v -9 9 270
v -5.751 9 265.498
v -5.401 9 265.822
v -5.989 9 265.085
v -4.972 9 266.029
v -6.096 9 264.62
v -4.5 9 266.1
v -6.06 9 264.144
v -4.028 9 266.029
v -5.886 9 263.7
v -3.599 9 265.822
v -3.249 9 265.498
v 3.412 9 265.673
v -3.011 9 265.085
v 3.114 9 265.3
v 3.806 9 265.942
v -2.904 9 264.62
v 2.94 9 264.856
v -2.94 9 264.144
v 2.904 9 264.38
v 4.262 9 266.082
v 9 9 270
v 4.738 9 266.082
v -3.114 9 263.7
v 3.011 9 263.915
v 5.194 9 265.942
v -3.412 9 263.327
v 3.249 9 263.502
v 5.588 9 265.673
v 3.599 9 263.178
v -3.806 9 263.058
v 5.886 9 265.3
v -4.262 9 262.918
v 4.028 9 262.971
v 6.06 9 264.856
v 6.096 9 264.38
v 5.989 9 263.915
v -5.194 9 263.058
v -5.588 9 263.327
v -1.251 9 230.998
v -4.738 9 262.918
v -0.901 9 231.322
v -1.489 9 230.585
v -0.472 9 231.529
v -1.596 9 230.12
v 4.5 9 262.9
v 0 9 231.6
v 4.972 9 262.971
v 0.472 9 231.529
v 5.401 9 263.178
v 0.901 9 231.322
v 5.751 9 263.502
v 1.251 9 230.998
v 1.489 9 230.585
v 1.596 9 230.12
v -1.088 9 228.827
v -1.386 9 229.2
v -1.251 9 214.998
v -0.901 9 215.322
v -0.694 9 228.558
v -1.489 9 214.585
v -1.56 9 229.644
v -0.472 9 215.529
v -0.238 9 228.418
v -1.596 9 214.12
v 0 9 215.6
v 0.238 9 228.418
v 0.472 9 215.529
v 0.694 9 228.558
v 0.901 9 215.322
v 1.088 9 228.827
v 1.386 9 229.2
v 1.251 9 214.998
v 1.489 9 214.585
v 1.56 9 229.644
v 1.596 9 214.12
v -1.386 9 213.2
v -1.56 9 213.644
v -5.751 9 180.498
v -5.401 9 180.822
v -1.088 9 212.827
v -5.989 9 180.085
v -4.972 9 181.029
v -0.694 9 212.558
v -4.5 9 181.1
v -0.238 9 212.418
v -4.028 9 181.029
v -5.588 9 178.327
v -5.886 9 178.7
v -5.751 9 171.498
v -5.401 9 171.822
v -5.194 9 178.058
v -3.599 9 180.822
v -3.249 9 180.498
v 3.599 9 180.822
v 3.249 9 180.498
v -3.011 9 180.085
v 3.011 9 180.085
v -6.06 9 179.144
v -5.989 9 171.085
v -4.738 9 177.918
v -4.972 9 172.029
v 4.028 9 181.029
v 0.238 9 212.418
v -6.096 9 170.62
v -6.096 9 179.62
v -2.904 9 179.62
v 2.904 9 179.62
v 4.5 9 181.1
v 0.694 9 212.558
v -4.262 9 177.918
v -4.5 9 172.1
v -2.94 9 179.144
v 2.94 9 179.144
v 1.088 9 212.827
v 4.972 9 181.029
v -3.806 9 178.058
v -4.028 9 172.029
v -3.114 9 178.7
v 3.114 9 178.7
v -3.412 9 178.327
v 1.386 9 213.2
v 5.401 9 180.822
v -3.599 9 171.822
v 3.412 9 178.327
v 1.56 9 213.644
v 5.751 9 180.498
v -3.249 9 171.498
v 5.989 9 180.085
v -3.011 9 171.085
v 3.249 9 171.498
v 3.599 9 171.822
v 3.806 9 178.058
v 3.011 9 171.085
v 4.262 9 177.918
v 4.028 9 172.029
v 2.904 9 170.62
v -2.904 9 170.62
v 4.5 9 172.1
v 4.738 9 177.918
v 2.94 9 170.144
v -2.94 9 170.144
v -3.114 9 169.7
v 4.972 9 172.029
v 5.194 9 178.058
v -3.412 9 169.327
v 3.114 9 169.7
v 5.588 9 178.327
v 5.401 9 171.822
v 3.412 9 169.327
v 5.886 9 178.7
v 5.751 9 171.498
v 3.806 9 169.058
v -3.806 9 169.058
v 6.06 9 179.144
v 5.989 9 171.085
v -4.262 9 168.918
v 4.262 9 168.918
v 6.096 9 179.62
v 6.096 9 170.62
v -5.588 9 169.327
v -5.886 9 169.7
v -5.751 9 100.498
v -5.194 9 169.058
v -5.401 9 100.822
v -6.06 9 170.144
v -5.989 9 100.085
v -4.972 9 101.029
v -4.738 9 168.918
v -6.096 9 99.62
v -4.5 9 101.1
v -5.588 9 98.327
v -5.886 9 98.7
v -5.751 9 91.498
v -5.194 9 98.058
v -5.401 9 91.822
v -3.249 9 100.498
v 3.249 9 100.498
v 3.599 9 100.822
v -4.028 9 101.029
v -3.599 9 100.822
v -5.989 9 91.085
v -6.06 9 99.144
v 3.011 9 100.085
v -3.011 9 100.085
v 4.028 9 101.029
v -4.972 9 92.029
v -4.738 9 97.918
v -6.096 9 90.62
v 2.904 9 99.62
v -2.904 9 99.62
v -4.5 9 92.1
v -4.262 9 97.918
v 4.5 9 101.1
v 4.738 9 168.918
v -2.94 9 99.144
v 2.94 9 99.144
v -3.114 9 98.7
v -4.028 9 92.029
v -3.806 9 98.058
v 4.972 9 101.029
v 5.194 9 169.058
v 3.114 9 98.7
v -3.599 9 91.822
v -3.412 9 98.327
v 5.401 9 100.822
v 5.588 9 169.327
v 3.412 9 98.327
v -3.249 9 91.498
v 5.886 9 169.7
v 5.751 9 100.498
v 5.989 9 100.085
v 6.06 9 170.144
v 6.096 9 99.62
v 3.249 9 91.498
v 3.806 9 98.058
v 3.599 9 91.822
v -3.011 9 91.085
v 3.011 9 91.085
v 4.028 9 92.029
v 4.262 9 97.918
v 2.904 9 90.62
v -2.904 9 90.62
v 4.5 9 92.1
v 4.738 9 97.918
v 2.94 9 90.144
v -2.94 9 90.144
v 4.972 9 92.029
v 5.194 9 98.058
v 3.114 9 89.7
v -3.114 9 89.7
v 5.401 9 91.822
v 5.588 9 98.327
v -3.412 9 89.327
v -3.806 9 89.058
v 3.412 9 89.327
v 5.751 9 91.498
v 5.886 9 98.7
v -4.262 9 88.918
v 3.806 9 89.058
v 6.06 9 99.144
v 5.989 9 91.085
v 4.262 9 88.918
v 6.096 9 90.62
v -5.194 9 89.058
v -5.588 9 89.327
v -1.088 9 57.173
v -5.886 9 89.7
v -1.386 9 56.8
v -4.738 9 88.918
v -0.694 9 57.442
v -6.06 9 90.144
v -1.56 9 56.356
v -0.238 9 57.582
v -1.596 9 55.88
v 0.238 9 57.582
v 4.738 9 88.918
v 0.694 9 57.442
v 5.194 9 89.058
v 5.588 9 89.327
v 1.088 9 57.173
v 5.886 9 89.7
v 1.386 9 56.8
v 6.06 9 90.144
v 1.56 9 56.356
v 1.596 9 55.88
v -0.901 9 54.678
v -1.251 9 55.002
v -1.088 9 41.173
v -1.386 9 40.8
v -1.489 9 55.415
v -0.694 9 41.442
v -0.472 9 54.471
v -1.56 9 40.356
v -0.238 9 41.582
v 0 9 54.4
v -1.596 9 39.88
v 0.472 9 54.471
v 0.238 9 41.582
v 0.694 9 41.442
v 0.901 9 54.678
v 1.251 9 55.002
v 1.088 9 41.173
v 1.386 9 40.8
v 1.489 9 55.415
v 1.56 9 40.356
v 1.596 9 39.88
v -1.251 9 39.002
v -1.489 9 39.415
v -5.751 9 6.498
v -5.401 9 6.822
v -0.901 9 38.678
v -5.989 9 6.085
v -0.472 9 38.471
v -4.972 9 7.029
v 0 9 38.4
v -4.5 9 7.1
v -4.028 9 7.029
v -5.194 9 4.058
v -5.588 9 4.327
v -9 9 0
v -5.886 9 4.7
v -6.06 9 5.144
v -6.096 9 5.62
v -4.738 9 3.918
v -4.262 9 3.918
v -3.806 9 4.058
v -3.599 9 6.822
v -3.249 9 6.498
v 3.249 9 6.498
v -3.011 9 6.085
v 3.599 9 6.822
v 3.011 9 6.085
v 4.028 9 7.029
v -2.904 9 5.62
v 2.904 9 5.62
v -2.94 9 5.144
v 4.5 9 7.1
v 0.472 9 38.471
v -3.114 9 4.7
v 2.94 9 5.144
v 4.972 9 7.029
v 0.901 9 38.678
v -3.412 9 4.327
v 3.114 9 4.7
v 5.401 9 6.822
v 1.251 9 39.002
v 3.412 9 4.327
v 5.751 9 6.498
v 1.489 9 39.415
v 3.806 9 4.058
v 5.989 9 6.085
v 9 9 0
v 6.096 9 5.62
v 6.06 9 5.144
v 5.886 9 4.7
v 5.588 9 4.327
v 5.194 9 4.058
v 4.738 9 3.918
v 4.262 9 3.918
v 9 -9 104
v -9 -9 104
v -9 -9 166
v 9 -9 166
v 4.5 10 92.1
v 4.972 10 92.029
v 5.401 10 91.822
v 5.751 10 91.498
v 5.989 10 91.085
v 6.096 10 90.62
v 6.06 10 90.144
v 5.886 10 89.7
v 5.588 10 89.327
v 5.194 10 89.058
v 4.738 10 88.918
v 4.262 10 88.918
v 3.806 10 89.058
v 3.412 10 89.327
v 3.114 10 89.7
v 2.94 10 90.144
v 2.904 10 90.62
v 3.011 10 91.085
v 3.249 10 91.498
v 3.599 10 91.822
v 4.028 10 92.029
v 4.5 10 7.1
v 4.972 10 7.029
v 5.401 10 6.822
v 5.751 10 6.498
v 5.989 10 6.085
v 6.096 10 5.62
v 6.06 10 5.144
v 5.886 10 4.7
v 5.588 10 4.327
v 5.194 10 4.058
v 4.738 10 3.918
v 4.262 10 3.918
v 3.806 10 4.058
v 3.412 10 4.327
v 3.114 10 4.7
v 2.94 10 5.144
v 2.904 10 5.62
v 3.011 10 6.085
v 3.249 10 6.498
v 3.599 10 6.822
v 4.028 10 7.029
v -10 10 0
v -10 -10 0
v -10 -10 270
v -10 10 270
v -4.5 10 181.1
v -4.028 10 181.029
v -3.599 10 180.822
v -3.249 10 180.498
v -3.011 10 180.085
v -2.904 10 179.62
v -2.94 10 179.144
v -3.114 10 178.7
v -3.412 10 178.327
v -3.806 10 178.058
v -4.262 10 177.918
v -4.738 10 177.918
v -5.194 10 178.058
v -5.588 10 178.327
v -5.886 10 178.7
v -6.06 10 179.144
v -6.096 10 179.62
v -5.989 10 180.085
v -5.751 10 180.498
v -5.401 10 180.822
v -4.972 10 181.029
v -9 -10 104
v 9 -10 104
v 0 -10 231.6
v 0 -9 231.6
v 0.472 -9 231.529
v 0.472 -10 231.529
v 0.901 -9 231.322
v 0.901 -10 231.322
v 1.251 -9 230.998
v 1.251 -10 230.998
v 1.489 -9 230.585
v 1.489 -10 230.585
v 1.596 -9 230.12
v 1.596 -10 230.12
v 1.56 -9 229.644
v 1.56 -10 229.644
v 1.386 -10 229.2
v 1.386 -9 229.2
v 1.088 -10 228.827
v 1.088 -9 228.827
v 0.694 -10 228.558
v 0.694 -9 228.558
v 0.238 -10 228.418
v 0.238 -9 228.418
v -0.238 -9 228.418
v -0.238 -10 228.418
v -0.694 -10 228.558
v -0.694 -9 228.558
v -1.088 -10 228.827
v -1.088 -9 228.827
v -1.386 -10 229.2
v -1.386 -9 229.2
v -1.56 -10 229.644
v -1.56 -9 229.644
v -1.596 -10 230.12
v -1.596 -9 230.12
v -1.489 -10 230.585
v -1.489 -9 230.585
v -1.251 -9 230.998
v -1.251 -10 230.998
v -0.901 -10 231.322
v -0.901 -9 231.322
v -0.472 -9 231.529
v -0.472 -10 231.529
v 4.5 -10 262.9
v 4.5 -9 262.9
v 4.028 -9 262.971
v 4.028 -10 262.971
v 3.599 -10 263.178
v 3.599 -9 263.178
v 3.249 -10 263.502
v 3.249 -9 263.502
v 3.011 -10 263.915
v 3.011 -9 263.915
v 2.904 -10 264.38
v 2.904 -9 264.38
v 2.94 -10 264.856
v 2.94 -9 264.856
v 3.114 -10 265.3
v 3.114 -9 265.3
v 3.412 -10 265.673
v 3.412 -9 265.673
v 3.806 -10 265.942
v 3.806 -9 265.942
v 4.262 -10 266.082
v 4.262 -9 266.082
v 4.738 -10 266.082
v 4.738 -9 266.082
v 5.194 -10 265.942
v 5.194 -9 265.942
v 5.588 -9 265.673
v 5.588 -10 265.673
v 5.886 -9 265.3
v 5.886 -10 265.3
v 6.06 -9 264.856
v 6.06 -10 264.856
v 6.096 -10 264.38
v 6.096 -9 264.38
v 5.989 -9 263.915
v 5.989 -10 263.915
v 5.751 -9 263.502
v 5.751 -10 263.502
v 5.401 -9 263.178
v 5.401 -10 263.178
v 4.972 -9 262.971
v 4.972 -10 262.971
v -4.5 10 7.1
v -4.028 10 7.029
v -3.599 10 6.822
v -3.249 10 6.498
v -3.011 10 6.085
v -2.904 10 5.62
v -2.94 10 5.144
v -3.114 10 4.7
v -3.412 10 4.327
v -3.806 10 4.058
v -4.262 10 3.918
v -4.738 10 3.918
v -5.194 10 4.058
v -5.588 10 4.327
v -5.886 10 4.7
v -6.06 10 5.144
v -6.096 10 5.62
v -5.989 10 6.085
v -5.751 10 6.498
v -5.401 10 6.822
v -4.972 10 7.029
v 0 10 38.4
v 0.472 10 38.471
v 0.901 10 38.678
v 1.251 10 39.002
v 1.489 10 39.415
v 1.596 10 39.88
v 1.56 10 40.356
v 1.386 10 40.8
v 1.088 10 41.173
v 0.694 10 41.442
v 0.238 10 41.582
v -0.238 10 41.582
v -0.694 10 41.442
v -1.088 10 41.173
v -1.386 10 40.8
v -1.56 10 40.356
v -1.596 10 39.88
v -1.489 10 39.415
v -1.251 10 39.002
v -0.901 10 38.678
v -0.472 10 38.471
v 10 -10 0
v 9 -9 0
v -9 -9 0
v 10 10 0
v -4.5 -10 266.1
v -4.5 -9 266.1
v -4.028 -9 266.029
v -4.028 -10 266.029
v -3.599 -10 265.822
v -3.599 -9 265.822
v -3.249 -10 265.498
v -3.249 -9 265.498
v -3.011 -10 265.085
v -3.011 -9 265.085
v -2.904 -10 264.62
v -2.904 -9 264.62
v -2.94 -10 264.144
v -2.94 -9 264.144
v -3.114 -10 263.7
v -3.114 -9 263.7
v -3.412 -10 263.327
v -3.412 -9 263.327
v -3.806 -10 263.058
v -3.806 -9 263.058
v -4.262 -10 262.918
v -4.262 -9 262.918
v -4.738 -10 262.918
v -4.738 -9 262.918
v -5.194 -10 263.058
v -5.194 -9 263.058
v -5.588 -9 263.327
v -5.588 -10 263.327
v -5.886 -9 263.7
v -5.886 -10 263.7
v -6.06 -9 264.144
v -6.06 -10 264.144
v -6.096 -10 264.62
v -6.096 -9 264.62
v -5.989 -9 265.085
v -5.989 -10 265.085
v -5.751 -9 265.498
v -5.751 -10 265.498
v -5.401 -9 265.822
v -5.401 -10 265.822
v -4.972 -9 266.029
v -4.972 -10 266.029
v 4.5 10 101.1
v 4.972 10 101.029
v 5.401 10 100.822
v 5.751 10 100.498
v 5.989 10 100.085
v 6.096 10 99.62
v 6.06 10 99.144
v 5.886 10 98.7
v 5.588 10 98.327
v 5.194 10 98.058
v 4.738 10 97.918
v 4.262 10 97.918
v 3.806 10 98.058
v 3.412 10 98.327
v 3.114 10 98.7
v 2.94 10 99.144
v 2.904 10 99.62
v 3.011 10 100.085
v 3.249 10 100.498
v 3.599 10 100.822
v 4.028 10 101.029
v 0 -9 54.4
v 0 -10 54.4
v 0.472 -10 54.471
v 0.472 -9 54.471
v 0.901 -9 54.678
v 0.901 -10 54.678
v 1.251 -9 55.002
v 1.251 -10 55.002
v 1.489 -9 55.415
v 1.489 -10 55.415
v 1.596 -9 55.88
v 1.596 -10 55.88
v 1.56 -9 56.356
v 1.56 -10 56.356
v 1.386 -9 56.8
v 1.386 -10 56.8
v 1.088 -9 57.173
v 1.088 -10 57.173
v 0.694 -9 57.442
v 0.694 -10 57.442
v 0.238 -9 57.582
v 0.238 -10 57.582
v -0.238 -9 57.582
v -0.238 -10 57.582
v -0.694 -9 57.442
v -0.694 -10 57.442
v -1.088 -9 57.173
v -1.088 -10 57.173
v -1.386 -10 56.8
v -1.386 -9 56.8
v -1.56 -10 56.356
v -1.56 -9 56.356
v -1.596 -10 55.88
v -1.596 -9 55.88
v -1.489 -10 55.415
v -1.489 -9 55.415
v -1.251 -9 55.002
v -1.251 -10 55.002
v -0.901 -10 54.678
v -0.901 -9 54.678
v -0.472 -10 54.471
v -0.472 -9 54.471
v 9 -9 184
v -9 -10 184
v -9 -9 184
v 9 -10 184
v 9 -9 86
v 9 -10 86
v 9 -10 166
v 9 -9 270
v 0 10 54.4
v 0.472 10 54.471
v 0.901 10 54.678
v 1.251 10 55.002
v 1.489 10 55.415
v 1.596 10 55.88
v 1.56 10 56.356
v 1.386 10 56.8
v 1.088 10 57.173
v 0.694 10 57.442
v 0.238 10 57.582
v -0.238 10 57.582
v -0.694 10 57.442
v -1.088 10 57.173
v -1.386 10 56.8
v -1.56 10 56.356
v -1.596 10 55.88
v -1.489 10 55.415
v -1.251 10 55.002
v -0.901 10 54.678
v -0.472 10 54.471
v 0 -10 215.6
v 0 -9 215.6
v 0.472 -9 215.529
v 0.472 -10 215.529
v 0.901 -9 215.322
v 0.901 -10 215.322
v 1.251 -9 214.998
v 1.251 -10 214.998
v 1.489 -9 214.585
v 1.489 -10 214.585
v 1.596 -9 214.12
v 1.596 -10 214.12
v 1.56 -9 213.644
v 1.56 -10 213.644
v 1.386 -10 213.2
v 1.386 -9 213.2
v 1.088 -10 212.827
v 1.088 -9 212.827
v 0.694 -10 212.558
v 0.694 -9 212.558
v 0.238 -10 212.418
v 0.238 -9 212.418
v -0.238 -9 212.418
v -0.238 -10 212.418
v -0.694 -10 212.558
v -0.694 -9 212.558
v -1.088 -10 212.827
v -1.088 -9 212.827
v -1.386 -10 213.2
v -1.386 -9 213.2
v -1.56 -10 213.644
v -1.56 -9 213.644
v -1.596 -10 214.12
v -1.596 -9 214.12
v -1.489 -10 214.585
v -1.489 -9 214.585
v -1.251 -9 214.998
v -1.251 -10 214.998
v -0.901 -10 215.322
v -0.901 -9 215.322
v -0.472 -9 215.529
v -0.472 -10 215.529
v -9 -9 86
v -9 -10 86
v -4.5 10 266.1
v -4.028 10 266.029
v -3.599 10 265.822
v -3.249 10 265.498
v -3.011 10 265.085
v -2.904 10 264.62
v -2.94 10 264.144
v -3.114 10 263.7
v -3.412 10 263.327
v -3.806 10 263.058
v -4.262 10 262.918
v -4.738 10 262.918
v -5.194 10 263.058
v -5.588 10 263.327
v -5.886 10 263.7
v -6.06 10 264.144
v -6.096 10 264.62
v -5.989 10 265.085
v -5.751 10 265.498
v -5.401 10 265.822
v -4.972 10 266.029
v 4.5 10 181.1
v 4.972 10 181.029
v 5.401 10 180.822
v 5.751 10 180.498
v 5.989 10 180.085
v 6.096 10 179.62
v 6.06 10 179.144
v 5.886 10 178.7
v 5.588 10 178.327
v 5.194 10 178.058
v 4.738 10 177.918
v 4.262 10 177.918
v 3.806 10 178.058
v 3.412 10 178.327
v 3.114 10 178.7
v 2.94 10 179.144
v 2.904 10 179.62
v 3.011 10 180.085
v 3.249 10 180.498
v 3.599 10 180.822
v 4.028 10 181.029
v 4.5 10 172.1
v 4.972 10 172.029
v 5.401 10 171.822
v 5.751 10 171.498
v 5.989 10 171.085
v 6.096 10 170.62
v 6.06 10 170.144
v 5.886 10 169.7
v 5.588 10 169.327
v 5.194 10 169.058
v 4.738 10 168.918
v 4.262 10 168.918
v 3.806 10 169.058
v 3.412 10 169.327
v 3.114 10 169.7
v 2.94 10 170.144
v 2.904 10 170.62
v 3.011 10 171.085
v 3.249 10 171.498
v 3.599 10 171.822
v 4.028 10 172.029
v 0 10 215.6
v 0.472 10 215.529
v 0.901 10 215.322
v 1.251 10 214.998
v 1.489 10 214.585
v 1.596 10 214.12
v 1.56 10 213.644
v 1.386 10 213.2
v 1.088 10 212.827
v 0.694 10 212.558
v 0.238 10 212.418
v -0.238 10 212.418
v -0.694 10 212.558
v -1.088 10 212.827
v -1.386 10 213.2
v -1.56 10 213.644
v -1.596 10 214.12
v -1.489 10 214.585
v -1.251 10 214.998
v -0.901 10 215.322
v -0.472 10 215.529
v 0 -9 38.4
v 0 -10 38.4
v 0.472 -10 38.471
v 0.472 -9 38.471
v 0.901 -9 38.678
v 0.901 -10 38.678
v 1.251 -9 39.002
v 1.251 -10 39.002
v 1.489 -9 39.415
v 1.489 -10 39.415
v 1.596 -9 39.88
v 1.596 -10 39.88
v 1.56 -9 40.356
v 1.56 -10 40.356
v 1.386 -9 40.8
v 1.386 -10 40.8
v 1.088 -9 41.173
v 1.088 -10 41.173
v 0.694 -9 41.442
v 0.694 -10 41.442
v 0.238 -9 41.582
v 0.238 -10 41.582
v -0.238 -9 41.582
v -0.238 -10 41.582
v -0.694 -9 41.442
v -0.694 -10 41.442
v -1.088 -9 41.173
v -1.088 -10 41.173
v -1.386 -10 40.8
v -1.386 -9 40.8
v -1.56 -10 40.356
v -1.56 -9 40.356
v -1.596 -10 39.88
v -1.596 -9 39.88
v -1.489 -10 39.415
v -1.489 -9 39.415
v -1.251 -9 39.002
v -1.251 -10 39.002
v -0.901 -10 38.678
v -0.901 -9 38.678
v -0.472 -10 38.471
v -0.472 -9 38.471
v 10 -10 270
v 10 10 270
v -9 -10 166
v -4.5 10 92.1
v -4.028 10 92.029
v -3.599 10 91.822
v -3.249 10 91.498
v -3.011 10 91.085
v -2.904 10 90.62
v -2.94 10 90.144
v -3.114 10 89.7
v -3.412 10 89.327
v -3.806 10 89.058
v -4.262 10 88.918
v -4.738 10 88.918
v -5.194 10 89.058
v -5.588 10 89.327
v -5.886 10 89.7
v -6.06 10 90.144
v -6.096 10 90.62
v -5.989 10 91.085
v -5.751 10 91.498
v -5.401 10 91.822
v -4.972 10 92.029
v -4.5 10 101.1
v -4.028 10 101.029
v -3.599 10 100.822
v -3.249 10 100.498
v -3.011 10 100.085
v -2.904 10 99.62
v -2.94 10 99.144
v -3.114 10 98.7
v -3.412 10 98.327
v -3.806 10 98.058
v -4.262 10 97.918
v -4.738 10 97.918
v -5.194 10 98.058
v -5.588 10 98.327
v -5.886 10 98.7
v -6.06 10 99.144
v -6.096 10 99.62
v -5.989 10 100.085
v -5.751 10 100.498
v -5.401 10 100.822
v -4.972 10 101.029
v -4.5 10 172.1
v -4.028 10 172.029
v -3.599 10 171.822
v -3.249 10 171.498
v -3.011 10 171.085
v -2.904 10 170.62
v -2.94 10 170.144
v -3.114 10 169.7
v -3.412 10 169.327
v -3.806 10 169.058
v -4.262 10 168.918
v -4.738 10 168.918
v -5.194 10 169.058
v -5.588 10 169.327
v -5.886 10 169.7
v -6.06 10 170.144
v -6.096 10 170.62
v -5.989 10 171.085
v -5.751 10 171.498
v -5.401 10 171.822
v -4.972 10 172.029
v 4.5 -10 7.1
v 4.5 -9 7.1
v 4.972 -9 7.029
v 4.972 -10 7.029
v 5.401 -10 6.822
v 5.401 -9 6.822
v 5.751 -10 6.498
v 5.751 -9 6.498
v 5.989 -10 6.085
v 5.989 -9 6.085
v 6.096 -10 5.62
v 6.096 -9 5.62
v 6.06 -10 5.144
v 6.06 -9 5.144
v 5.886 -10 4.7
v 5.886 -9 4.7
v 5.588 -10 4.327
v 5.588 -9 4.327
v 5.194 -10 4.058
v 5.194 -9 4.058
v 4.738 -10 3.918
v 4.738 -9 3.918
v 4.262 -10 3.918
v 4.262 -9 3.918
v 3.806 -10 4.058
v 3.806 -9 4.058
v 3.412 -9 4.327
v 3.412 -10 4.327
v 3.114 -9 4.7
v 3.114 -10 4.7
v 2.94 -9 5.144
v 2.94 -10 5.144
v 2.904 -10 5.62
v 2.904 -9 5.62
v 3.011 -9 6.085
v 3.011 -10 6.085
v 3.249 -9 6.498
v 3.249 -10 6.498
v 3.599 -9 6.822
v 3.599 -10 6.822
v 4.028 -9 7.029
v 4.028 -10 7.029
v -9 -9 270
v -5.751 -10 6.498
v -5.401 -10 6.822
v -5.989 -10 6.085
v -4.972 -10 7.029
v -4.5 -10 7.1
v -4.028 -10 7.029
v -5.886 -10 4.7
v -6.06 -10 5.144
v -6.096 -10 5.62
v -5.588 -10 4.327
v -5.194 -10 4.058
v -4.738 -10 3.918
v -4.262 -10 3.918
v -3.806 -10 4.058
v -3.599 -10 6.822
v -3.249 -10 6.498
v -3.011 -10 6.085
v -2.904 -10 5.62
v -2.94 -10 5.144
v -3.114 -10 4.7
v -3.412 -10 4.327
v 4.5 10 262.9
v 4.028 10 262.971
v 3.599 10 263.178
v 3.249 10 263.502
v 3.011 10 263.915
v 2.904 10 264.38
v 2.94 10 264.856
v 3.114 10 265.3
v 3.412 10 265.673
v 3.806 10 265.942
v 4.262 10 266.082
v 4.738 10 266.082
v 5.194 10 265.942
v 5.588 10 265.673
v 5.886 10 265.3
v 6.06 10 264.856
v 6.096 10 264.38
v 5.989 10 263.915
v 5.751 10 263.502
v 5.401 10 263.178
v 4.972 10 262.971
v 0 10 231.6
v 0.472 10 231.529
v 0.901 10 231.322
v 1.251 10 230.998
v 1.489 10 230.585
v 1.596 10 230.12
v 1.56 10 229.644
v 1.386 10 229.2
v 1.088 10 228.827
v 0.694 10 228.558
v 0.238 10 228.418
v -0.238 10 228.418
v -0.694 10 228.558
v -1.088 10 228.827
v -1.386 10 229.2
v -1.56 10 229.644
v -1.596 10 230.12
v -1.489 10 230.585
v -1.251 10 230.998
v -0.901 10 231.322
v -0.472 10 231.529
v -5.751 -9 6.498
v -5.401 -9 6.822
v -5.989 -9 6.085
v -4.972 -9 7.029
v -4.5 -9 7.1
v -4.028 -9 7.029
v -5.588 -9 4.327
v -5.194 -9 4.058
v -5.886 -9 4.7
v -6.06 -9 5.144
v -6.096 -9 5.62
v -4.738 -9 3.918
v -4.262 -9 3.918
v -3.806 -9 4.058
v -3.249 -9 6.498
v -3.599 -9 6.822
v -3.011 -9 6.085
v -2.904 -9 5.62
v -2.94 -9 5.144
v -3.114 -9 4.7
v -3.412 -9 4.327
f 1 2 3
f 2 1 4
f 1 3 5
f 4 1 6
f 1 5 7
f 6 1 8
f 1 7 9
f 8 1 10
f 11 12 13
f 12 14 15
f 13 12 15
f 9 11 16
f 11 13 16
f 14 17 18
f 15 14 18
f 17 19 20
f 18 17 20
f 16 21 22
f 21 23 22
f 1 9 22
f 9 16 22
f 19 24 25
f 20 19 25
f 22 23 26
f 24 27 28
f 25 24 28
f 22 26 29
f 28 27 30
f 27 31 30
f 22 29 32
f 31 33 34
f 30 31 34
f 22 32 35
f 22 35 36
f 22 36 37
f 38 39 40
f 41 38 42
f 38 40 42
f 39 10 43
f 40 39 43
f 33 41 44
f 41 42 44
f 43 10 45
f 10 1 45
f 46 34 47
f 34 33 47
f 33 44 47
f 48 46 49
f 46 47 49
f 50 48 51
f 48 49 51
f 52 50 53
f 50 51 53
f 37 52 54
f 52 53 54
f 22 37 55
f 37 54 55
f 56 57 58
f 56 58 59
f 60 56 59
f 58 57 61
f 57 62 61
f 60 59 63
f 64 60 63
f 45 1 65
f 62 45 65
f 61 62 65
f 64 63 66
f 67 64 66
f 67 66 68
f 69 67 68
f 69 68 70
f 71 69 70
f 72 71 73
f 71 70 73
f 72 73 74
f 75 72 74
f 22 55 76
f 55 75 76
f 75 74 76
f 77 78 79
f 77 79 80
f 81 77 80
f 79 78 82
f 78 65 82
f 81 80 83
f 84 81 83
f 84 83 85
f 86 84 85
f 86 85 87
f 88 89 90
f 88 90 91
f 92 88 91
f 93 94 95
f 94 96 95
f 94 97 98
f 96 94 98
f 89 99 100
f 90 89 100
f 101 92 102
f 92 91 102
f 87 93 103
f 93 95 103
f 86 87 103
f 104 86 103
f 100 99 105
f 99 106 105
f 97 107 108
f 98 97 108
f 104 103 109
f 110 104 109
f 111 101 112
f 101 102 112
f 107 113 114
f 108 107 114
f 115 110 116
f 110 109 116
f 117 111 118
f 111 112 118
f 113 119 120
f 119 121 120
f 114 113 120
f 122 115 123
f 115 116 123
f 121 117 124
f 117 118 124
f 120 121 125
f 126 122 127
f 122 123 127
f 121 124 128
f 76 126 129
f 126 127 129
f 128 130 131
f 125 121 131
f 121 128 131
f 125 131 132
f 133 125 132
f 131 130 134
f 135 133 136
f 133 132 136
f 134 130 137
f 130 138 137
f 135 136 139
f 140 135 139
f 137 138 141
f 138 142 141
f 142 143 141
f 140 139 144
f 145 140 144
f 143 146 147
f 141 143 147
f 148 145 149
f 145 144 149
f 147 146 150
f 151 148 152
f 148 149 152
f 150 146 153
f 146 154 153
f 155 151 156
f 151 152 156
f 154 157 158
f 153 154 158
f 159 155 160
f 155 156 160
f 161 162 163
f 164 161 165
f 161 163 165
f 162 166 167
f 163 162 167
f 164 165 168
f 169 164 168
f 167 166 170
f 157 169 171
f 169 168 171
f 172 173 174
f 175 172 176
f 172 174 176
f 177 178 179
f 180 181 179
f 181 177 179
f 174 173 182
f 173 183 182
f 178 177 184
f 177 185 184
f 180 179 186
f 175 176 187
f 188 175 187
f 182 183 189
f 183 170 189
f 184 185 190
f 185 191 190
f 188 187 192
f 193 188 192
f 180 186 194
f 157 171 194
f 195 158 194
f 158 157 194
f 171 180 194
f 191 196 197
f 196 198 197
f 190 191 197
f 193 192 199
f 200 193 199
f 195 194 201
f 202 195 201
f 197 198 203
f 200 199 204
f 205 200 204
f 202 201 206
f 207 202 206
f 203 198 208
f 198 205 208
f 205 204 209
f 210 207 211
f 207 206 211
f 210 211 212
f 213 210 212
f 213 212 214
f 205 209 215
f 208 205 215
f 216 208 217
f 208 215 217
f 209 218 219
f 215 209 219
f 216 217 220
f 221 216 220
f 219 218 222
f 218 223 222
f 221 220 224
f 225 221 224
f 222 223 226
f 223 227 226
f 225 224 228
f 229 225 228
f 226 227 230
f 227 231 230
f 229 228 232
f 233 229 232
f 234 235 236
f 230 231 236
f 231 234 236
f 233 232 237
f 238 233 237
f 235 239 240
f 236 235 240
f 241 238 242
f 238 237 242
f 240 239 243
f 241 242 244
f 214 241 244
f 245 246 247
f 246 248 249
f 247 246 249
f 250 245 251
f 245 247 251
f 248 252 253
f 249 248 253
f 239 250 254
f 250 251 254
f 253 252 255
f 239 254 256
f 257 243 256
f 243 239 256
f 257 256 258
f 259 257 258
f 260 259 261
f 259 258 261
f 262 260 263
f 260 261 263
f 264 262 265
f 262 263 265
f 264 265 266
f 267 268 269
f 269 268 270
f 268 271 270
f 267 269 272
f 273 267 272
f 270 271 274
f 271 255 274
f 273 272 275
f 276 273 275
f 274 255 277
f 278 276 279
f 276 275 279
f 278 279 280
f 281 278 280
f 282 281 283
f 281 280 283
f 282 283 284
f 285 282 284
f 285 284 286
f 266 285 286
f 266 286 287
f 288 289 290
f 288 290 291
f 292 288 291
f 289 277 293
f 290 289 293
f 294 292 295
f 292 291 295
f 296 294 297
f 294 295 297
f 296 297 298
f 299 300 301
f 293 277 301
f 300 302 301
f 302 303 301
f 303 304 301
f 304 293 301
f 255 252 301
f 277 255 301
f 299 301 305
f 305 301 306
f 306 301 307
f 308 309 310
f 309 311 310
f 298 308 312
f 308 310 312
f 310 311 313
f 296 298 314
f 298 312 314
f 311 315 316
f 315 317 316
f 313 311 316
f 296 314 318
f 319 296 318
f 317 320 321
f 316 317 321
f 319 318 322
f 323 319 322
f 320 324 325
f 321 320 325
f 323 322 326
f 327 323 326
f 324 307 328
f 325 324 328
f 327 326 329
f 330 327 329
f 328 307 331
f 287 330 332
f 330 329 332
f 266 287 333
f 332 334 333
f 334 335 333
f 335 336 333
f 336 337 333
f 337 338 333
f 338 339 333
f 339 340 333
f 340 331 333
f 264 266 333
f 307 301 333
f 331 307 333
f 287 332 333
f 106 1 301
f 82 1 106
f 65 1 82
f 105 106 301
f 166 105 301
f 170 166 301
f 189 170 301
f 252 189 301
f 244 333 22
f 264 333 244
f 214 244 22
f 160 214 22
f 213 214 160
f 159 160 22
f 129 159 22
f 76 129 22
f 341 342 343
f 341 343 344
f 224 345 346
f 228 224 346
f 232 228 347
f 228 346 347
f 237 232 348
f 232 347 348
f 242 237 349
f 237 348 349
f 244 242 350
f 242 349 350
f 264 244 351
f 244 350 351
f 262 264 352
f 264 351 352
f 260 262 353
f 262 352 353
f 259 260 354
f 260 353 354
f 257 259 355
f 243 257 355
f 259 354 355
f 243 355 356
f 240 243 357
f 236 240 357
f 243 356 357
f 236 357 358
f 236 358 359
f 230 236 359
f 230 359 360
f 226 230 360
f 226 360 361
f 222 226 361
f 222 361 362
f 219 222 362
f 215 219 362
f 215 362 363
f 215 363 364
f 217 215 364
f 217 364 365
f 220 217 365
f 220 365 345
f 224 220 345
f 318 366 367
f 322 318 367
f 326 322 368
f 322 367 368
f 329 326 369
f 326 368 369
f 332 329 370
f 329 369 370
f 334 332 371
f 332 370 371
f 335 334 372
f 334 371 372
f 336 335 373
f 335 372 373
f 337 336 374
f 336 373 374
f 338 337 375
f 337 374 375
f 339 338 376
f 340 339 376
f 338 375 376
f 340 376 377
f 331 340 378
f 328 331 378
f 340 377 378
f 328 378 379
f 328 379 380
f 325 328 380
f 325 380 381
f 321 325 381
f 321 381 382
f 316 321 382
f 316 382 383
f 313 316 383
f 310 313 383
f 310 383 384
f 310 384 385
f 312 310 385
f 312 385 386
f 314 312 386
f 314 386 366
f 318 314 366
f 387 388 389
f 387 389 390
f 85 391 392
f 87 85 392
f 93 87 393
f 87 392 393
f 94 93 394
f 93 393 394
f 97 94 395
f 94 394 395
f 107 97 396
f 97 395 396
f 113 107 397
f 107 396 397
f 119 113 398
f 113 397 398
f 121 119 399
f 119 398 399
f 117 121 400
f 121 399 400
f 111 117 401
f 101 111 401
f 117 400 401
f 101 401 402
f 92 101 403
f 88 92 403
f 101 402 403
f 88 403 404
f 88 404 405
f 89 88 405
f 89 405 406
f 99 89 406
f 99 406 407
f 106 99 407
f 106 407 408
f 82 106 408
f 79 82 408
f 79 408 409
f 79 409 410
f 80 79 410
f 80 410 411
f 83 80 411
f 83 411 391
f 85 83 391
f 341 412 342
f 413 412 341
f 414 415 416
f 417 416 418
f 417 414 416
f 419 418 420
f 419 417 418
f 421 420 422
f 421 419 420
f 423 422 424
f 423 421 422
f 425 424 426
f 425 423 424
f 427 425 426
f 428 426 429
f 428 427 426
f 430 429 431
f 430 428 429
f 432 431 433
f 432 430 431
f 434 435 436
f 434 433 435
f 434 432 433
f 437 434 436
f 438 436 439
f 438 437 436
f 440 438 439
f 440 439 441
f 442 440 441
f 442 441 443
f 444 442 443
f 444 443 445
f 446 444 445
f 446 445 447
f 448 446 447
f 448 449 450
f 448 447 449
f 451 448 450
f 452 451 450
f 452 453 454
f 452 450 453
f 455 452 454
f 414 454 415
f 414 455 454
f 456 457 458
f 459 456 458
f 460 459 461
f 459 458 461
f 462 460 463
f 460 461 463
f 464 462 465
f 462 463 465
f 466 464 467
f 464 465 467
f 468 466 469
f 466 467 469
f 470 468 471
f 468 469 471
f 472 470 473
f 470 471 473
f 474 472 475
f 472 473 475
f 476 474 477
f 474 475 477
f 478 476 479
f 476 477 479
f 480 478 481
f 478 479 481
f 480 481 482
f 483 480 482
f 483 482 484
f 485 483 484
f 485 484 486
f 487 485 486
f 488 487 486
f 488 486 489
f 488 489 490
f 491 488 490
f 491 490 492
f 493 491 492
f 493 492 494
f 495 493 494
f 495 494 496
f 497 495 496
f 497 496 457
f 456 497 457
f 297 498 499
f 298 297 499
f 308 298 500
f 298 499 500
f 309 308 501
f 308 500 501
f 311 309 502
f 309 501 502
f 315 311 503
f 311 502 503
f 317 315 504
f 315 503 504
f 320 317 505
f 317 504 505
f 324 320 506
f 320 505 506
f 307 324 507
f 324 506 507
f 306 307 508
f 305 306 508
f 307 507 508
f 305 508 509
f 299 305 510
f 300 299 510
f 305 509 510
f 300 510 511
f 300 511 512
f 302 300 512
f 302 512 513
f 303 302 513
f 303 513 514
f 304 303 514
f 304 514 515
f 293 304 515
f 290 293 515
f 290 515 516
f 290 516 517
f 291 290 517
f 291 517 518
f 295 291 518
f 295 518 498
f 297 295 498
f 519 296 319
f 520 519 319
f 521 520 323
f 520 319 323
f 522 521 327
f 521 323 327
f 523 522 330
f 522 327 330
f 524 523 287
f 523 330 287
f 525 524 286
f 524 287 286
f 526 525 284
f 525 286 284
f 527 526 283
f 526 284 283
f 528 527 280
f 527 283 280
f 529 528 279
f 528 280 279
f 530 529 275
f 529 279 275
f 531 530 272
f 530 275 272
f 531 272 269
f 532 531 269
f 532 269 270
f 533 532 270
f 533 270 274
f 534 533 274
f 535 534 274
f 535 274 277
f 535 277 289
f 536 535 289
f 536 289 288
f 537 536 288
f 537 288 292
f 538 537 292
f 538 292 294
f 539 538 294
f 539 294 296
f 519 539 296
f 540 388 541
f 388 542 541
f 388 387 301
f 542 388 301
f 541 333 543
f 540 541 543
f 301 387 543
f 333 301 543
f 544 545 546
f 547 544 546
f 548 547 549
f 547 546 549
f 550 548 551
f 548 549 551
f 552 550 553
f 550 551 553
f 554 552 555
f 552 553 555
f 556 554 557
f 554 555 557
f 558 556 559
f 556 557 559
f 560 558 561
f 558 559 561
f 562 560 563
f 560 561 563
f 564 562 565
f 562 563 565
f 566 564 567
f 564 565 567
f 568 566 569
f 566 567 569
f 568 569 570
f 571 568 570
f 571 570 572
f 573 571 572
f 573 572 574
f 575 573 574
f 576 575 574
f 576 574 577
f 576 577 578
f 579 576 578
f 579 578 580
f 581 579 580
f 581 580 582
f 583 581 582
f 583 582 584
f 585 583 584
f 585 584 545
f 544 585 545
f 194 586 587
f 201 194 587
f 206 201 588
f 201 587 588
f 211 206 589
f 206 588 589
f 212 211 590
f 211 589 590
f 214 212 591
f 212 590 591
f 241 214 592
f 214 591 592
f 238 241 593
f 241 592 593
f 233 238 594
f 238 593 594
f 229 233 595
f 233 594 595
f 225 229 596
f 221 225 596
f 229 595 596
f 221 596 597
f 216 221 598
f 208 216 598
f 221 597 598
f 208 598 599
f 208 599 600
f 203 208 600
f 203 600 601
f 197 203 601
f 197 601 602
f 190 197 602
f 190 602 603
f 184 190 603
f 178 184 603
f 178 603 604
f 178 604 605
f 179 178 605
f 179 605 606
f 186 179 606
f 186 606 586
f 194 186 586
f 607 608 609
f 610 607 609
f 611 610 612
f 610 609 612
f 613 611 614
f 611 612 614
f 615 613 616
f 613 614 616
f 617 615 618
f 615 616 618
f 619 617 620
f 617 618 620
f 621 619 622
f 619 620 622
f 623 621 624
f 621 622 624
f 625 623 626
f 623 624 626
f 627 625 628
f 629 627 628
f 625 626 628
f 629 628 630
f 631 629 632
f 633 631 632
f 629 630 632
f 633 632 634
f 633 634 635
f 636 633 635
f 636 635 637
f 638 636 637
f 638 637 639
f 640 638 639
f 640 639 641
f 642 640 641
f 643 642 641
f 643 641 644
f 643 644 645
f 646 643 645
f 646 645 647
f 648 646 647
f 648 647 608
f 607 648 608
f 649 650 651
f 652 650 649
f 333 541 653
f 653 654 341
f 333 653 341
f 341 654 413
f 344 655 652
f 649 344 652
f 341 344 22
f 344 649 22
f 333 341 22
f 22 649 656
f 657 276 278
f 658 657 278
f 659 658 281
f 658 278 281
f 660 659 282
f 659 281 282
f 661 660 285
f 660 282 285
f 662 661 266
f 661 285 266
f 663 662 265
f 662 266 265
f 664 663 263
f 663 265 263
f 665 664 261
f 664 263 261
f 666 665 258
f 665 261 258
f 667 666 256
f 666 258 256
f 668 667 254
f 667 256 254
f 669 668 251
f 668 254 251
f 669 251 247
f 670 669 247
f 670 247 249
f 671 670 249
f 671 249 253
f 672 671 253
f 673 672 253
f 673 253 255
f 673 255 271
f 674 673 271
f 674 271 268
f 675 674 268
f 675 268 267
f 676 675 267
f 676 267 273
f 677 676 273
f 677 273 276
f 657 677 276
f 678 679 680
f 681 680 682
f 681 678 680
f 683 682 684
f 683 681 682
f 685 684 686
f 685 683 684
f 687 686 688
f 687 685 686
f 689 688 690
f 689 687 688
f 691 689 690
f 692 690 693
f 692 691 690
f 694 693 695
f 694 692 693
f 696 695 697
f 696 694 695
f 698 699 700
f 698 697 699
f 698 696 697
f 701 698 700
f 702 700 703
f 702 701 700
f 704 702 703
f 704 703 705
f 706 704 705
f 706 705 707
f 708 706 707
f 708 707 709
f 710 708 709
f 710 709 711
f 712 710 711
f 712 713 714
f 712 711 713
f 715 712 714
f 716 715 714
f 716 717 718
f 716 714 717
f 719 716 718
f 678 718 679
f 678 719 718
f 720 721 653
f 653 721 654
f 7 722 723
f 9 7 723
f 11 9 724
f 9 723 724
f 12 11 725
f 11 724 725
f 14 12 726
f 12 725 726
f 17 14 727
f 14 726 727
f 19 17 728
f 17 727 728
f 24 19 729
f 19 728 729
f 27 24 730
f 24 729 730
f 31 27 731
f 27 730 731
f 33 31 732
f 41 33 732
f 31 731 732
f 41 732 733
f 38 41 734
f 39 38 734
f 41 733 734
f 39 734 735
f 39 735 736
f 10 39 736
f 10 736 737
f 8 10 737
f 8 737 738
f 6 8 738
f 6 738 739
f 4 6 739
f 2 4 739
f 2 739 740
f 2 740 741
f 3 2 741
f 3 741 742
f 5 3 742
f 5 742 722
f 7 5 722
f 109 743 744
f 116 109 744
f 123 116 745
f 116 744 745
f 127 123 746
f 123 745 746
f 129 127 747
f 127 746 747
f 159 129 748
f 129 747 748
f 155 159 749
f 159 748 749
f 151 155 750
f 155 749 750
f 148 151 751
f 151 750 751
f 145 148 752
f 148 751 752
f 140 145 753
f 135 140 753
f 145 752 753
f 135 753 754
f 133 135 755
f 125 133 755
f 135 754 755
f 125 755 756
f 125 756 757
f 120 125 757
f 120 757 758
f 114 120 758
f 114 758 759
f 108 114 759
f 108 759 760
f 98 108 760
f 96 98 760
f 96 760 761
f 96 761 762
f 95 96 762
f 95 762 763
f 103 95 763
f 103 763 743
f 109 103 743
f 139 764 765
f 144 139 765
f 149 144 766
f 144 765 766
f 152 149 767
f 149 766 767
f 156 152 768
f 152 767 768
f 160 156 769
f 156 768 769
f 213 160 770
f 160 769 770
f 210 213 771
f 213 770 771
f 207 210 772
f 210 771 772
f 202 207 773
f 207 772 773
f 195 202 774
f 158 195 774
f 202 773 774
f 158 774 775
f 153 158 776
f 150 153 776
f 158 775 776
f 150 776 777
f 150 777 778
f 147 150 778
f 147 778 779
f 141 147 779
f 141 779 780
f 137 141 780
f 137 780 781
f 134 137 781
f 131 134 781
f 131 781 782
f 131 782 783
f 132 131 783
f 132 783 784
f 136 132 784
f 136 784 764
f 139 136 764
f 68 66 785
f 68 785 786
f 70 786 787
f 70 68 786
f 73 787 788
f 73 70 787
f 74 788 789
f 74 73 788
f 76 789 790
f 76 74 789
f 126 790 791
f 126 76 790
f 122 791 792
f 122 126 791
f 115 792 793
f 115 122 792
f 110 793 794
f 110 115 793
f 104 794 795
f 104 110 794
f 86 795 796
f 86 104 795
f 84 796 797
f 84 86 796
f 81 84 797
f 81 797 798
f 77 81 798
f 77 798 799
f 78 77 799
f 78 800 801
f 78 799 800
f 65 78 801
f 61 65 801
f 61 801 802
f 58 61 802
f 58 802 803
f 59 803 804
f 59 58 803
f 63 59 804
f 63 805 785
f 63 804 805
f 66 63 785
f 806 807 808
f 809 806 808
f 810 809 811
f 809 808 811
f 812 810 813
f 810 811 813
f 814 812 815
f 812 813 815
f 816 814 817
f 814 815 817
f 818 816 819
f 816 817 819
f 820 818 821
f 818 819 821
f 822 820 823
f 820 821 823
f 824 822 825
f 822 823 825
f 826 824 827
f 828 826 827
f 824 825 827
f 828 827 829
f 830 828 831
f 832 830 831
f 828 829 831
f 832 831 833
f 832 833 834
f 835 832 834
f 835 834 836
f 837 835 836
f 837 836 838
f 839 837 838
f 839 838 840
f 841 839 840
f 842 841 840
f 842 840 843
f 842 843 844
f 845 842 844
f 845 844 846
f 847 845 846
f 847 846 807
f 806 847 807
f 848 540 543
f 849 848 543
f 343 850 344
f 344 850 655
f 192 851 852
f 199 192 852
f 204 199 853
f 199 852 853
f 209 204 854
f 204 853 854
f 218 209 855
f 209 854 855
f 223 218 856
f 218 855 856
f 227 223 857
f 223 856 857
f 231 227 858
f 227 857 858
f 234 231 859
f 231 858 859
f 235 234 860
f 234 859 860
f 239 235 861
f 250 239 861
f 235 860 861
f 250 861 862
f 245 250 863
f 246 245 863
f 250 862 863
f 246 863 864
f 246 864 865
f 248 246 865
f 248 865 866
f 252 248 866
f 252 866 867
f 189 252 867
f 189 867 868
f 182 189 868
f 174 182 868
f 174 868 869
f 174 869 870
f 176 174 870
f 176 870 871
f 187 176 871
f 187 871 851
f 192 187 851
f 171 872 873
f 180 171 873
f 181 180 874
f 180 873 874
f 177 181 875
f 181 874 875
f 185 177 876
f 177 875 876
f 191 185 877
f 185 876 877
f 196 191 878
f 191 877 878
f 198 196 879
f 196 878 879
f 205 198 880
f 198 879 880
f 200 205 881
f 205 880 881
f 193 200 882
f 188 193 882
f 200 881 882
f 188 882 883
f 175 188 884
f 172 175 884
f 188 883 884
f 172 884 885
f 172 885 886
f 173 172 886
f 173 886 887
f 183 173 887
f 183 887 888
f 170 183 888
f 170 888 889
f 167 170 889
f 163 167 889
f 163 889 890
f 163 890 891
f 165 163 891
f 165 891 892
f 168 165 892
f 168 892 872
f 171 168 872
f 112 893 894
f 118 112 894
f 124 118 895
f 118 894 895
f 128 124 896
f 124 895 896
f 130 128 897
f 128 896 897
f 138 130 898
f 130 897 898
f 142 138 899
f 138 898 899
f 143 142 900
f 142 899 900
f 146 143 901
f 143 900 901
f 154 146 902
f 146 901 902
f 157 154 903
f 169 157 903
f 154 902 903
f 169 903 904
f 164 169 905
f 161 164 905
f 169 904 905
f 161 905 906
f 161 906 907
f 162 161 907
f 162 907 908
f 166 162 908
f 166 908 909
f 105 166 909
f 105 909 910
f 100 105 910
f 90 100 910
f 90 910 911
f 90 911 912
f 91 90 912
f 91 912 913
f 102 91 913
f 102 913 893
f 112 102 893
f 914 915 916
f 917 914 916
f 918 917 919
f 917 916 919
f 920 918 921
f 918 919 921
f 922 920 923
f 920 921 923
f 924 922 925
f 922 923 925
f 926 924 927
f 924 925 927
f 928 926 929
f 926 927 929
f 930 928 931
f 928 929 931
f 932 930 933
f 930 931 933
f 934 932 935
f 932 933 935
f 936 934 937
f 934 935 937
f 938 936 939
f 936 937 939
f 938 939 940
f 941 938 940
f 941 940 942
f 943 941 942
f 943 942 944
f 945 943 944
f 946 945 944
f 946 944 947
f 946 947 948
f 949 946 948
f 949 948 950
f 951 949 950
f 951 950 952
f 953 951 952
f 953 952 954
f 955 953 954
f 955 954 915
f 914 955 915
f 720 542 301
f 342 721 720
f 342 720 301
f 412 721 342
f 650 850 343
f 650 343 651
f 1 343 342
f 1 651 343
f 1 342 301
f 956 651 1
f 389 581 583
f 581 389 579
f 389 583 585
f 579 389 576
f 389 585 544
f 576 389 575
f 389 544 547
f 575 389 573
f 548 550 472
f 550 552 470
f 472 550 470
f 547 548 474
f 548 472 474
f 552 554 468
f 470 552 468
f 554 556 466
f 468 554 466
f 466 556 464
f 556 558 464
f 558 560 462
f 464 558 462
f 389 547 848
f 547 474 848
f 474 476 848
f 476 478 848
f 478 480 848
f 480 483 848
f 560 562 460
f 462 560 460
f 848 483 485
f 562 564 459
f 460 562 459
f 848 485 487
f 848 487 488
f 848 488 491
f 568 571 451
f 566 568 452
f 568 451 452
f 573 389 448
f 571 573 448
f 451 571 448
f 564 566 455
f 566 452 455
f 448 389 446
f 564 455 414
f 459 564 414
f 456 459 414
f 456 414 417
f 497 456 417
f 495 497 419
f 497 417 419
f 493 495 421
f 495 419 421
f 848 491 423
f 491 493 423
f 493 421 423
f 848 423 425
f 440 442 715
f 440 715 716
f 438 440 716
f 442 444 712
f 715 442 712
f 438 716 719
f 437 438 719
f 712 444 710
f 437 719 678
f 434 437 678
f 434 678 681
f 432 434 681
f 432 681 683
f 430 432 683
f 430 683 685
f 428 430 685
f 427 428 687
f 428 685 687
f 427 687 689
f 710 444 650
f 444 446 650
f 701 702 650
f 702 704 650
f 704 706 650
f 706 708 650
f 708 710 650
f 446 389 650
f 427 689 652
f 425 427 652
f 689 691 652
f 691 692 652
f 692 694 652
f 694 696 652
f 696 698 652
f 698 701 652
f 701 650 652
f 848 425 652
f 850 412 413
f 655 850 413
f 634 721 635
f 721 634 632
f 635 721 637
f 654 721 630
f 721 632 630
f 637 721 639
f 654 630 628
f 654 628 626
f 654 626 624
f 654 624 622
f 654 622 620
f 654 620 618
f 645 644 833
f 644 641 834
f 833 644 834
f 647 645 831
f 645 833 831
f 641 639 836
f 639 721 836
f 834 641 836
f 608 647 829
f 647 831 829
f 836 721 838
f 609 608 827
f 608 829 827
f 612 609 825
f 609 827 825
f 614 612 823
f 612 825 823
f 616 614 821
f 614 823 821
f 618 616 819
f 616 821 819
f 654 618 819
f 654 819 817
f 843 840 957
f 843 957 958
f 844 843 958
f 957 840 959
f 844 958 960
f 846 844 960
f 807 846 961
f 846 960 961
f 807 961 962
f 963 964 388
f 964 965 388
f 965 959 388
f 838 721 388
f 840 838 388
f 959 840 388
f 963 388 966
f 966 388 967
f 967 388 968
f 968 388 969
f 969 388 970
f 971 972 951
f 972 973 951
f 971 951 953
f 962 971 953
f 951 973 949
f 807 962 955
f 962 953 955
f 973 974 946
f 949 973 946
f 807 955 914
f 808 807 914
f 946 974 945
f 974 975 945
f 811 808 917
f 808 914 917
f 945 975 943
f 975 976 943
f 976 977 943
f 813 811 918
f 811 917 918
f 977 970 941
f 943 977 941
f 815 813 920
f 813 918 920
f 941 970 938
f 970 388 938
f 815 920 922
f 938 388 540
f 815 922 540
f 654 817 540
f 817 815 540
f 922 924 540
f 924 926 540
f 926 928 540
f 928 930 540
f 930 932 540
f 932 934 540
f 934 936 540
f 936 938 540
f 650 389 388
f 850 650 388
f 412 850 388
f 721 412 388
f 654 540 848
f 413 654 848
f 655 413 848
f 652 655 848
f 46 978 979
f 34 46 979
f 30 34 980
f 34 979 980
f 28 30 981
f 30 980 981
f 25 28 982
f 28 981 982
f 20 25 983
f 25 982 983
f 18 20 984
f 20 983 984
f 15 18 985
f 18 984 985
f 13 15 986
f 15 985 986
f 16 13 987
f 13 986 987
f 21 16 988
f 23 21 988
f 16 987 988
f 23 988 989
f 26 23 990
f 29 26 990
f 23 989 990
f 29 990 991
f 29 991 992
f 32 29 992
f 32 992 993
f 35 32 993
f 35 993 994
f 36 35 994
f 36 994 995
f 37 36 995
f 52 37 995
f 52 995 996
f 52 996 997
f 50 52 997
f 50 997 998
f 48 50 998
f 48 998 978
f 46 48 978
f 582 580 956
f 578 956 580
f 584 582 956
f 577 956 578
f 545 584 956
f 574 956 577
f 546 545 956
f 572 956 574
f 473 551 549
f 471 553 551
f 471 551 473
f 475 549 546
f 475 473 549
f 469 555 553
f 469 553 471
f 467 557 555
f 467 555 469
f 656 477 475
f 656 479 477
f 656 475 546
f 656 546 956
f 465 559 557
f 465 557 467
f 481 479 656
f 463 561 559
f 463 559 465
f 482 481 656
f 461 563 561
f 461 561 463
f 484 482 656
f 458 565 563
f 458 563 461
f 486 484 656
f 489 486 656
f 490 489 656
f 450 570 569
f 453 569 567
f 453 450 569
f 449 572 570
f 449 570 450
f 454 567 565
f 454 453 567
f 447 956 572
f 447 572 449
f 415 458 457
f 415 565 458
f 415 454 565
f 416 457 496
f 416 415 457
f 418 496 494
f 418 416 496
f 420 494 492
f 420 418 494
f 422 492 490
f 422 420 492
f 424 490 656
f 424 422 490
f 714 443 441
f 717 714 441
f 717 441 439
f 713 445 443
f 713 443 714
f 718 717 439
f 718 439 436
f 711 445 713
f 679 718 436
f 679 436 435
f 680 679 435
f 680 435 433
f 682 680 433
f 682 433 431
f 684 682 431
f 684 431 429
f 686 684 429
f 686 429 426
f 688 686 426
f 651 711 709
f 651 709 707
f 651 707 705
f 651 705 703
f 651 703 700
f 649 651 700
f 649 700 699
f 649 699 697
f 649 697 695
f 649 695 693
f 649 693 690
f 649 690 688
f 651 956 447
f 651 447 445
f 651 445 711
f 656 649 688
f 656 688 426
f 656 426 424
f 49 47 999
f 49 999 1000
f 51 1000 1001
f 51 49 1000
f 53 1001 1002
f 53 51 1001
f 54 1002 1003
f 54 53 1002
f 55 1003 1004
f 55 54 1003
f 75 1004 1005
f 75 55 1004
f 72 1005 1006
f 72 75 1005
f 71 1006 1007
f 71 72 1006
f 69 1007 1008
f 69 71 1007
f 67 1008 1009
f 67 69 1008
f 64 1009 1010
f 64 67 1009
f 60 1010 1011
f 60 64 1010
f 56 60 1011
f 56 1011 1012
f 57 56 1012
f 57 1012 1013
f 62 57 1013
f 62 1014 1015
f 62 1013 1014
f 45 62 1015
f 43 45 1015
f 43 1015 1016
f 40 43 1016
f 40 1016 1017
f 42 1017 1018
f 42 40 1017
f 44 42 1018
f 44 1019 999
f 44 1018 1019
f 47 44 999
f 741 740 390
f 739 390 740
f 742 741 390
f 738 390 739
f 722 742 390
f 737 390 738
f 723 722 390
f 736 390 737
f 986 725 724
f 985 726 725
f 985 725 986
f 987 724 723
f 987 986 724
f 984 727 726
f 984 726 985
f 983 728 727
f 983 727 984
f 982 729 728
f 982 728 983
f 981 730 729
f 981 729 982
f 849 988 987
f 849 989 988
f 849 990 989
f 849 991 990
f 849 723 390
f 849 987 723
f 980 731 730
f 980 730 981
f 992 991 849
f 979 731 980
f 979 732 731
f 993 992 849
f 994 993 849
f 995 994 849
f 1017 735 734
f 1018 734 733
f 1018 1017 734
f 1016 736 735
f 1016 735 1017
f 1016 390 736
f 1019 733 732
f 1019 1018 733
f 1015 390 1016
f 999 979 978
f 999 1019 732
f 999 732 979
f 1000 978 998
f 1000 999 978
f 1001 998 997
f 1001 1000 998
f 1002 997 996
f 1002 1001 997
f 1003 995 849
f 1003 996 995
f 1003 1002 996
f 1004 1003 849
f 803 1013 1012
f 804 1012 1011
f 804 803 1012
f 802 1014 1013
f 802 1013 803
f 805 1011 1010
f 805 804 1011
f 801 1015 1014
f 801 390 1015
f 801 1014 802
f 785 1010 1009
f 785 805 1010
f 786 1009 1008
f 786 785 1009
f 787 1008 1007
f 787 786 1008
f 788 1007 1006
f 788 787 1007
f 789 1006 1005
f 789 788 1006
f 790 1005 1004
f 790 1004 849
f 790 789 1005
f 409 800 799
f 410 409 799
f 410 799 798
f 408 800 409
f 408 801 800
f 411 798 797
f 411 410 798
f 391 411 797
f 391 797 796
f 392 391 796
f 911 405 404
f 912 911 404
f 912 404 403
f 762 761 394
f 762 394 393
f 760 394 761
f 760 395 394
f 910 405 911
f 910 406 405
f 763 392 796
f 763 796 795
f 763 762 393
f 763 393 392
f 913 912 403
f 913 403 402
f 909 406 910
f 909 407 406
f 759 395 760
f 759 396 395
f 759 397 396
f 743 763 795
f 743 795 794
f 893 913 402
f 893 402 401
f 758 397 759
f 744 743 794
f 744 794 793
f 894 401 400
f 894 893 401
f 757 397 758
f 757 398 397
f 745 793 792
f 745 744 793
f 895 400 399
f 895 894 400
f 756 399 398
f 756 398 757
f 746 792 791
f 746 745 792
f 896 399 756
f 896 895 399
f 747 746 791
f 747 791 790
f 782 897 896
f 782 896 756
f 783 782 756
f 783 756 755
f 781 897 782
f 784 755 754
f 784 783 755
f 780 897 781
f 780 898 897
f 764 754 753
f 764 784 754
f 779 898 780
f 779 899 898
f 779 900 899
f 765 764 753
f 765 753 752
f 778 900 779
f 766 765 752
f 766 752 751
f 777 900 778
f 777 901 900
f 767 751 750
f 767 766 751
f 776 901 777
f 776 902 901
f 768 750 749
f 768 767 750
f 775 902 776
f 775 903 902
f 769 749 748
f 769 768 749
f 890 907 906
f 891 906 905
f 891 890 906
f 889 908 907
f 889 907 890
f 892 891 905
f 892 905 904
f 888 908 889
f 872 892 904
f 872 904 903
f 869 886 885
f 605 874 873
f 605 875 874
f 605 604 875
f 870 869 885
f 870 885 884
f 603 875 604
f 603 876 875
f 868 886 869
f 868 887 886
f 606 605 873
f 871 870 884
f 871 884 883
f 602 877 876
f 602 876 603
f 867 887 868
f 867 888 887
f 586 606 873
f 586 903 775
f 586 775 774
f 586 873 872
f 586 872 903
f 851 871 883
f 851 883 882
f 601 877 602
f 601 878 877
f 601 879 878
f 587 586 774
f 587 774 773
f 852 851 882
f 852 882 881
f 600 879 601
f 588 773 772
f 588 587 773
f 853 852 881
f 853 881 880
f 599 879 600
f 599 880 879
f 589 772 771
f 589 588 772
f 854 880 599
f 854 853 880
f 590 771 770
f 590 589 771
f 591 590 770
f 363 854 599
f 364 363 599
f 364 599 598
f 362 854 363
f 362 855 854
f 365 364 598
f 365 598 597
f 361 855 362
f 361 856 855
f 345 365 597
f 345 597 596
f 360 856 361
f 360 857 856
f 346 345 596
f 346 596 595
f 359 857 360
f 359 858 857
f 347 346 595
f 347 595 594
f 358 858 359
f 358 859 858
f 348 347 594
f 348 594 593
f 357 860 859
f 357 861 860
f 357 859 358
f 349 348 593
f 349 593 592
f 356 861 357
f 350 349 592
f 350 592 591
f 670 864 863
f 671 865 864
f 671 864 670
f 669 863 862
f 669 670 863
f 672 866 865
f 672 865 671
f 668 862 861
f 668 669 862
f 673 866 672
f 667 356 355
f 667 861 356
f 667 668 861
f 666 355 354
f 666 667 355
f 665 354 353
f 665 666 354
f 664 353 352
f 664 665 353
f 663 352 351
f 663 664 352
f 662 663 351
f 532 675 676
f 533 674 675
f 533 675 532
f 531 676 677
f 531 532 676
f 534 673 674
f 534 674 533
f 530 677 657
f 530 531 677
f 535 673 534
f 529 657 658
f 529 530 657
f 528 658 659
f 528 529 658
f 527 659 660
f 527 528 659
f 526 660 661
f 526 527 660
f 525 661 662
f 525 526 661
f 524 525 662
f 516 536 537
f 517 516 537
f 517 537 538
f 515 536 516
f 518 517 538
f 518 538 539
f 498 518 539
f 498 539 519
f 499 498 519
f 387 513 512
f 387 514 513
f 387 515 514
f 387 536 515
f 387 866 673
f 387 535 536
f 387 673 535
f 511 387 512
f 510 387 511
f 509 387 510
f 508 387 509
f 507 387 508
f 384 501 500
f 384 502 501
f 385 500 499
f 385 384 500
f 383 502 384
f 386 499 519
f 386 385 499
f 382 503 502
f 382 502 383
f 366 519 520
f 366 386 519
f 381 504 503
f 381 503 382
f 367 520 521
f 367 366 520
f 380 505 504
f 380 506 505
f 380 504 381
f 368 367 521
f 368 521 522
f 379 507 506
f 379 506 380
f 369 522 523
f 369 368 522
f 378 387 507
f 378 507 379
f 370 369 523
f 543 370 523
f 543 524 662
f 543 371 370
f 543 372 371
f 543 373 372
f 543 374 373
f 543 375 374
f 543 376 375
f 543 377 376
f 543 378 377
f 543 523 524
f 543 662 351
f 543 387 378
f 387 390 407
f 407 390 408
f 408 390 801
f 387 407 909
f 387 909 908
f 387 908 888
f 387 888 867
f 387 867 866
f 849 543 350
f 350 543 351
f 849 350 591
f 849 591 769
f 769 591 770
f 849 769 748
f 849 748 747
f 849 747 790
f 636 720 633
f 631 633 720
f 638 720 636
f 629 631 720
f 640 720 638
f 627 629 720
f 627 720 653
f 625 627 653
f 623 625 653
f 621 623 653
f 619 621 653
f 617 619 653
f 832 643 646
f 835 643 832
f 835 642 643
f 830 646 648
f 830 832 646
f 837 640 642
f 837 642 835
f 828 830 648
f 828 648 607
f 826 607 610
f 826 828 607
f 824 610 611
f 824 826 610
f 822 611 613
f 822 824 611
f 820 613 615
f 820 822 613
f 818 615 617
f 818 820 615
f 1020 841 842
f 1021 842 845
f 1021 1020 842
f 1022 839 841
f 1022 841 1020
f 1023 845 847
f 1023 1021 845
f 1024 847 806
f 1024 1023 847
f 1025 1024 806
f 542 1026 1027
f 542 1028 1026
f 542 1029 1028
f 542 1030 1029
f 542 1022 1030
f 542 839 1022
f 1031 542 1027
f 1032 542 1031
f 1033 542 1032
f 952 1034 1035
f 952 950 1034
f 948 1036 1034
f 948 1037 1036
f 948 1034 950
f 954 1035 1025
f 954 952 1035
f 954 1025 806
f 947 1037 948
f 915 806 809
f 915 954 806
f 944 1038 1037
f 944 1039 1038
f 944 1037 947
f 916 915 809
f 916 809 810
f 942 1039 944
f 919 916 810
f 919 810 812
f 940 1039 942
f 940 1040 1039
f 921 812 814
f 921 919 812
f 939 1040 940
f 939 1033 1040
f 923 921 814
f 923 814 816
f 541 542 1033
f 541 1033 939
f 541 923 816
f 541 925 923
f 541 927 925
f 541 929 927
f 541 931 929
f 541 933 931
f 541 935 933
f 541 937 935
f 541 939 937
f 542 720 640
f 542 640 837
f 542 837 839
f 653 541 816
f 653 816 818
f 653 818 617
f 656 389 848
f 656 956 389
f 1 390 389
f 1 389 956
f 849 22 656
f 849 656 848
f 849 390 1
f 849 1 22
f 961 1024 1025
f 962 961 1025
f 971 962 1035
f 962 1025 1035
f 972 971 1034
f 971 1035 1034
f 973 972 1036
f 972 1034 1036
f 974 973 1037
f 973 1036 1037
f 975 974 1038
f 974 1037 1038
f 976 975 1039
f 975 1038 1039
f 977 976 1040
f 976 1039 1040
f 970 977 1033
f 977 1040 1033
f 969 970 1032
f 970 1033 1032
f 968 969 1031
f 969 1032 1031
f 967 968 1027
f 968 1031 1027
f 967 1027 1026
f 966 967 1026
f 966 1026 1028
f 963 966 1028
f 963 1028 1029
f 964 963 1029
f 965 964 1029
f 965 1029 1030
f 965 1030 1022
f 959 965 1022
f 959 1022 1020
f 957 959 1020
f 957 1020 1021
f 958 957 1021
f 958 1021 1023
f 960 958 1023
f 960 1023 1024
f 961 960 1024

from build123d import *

# Parameters (mm, degrees)
SKETCH_1_W          = 20
SKETCH_1_H          = 20
SKETCH_1_W_2        = 18
SKETCH_1_H_2        = 18
EXTRUDE_1_DEPTH     = 270
SKETCH_2_R          = 1.6
CUT_EXTRUDE_1_DEPTH = 271.924343683
CUT_EXTRUDE_2_REACH = 272.924
SKETCH_3_W          = 18
SKETCH_3_H          = 18
SKETCH_4_R          = 1.6
CUT_EXTRUDE_3_DEPTH = 271.924343683
SKETCH_5_R          = 1.6
CUT_EXTRUDE_4_DEPTH = 271.924343683


with BuildPart() as part:
    # 草图1 → 凸台-拉伸1 (new body)
    with BuildSketch(Plane.XY):
        Rectangle(SKETCH_1_W, SKETCH_1_H)
        Rectangle(SKETCH_1_W_2, SKETCH_1_H_2, mode=Mode.SUBTRACT)
    extrude(amount=EXTRUDE_1_DEPTH)

    # 草图2 → 切除-拉伸1 (cut, through all)
    with BuildSketch(Plane(origin=(0, 10, 0), x_dir=(1, 0, 0), z_dir=(0, 1, 0))):
        with Locations(Location((-4.5, -179.5, 0), (0, 0, 270))):
            Circle(SKETCH_2_R)
        with Locations(Location((4.5, -179.5, 0), (0, 0, 270))):
            Circle(SKETCH_2_R)
        with Locations(Location((4.5, -170.5, 0), (0, 0, 270))):
            Circle(SKETCH_2_R)
        with Locations(Location((-4.5, -170.5, 0), (0, 0, 270))):
            Circle(SKETCH_2_R)
        with Locations(Location((-4.5, -99.5, 0), (0, 0, 270))):
            Circle(SKETCH_2_R)
        with Locations(Location((4.5, -90.5, 0), (0, 0, 270))):
            Circle(SKETCH_2_R)
        with Locations(Location((4.5, -99.5, 0), (0, 0, 270))):
            Circle(SKETCH_2_R)
        with Locations(Location((-4.5, -90.5, 0), (0, 0, 270))):
            Circle(SKETCH_2_R)
    extrude(amount=-CUT_EXTRUDE_1_DEPTH, mode=Mode.SUBTRACT)

    # 草图3 → 切除-拉伸2 (cut, up to next)
    with BuildSketch(Plane.XZ.offset(10), mode=Mode.PRIVATE) as cut_extrude_2_sk1:
        with Locations((0, 175)):
            Rectangle(SKETCH_3_W, SKETCH_3_H)
    cut_extrude_2_tool1 = extrude(cut_extrude_2_sk1.sketch, amount=-CUT_EXTRUDE_2_REACH, mode=Mode.PRIVATE) & part.part
    # 草图3 → 切除-拉伸2 (cut, up to next)
    with BuildSketch(Plane.XZ.offset(10), mode=Mode.PRIVATE) as cut_extrude_2_sk2:
        with Locations((0, 95)):
            Rectangle(SKETCH_3_W, SKETCH_3_H)
    cut_extrude_2_tool2 = extrude(cut_extrude_2_sk2.sketch, amount=-CUT_EXTRUDE_2_REACH, mode=Mode.PRIVATE) & part.part
    add(cut_extrude_2_tool1.solids().sort_by_distance((0, -10, 175))[0], mode=Mode.SUBTRACT)
    add(cut_extrude_2_tool2.solids().sort_by_distance((0, -10, 95))[0], mode=Mode.SUBTRACT)

    # 草图4 → 切除-拉伸3 (cut, through all)
    with BuildSketch(Plane(origin=(0, 10, 0), x_dir=(1, 0, 0), z_dir=(0, 1, 0))):
        with Locations(Location((-4.5, -5.5, 0), (0, 0, 270))):
            Circle(SKETCH_4_R)
        with Locations(Location((4.5, -5.5, 0), (0, 0, 270))):
            Circle(SKETCH_4_R)
        with Locations(Location((-4.5, -264.5, 0), (0, 0, 270))):
            Circle(SKETCH_4_R)
        with Locations(Location((4.5, -264.5, 0), (0, 0, 90))):
            Circle(SKETCH_4_R)
    extrude(amount=-CUT_EXTRUDE_3_DEPTH, mode=Mode.SUBTRACT)

    # 草图5 → 切除-拉伸4 (cut, through all)
    with BuildSketch(Plane.XZ.offset(10)):
        with Locations(Location((0, 56, 0), (0, 0, 270))):
            Circle(SKETCH_5_R)
        with Locations(Location((0, 40, 0), (0, 0, 270))):
            Circle(SKETCH_5_R)
    cut_extrude_4 = extrude(amount=-CUT_EXTRUDE_4_DEPTH, mode=Mode.SUBTRACT)

    # 镜向1: 切除-拉伸4 across plane
    add(cut_extrude_4.mirror(Plane(origin=(0, 0, 135), x_dir=(1, 0, 0), z_dir=(0, 0, -1))), mode=Mode.SUBTRACT)


solid = part.part
